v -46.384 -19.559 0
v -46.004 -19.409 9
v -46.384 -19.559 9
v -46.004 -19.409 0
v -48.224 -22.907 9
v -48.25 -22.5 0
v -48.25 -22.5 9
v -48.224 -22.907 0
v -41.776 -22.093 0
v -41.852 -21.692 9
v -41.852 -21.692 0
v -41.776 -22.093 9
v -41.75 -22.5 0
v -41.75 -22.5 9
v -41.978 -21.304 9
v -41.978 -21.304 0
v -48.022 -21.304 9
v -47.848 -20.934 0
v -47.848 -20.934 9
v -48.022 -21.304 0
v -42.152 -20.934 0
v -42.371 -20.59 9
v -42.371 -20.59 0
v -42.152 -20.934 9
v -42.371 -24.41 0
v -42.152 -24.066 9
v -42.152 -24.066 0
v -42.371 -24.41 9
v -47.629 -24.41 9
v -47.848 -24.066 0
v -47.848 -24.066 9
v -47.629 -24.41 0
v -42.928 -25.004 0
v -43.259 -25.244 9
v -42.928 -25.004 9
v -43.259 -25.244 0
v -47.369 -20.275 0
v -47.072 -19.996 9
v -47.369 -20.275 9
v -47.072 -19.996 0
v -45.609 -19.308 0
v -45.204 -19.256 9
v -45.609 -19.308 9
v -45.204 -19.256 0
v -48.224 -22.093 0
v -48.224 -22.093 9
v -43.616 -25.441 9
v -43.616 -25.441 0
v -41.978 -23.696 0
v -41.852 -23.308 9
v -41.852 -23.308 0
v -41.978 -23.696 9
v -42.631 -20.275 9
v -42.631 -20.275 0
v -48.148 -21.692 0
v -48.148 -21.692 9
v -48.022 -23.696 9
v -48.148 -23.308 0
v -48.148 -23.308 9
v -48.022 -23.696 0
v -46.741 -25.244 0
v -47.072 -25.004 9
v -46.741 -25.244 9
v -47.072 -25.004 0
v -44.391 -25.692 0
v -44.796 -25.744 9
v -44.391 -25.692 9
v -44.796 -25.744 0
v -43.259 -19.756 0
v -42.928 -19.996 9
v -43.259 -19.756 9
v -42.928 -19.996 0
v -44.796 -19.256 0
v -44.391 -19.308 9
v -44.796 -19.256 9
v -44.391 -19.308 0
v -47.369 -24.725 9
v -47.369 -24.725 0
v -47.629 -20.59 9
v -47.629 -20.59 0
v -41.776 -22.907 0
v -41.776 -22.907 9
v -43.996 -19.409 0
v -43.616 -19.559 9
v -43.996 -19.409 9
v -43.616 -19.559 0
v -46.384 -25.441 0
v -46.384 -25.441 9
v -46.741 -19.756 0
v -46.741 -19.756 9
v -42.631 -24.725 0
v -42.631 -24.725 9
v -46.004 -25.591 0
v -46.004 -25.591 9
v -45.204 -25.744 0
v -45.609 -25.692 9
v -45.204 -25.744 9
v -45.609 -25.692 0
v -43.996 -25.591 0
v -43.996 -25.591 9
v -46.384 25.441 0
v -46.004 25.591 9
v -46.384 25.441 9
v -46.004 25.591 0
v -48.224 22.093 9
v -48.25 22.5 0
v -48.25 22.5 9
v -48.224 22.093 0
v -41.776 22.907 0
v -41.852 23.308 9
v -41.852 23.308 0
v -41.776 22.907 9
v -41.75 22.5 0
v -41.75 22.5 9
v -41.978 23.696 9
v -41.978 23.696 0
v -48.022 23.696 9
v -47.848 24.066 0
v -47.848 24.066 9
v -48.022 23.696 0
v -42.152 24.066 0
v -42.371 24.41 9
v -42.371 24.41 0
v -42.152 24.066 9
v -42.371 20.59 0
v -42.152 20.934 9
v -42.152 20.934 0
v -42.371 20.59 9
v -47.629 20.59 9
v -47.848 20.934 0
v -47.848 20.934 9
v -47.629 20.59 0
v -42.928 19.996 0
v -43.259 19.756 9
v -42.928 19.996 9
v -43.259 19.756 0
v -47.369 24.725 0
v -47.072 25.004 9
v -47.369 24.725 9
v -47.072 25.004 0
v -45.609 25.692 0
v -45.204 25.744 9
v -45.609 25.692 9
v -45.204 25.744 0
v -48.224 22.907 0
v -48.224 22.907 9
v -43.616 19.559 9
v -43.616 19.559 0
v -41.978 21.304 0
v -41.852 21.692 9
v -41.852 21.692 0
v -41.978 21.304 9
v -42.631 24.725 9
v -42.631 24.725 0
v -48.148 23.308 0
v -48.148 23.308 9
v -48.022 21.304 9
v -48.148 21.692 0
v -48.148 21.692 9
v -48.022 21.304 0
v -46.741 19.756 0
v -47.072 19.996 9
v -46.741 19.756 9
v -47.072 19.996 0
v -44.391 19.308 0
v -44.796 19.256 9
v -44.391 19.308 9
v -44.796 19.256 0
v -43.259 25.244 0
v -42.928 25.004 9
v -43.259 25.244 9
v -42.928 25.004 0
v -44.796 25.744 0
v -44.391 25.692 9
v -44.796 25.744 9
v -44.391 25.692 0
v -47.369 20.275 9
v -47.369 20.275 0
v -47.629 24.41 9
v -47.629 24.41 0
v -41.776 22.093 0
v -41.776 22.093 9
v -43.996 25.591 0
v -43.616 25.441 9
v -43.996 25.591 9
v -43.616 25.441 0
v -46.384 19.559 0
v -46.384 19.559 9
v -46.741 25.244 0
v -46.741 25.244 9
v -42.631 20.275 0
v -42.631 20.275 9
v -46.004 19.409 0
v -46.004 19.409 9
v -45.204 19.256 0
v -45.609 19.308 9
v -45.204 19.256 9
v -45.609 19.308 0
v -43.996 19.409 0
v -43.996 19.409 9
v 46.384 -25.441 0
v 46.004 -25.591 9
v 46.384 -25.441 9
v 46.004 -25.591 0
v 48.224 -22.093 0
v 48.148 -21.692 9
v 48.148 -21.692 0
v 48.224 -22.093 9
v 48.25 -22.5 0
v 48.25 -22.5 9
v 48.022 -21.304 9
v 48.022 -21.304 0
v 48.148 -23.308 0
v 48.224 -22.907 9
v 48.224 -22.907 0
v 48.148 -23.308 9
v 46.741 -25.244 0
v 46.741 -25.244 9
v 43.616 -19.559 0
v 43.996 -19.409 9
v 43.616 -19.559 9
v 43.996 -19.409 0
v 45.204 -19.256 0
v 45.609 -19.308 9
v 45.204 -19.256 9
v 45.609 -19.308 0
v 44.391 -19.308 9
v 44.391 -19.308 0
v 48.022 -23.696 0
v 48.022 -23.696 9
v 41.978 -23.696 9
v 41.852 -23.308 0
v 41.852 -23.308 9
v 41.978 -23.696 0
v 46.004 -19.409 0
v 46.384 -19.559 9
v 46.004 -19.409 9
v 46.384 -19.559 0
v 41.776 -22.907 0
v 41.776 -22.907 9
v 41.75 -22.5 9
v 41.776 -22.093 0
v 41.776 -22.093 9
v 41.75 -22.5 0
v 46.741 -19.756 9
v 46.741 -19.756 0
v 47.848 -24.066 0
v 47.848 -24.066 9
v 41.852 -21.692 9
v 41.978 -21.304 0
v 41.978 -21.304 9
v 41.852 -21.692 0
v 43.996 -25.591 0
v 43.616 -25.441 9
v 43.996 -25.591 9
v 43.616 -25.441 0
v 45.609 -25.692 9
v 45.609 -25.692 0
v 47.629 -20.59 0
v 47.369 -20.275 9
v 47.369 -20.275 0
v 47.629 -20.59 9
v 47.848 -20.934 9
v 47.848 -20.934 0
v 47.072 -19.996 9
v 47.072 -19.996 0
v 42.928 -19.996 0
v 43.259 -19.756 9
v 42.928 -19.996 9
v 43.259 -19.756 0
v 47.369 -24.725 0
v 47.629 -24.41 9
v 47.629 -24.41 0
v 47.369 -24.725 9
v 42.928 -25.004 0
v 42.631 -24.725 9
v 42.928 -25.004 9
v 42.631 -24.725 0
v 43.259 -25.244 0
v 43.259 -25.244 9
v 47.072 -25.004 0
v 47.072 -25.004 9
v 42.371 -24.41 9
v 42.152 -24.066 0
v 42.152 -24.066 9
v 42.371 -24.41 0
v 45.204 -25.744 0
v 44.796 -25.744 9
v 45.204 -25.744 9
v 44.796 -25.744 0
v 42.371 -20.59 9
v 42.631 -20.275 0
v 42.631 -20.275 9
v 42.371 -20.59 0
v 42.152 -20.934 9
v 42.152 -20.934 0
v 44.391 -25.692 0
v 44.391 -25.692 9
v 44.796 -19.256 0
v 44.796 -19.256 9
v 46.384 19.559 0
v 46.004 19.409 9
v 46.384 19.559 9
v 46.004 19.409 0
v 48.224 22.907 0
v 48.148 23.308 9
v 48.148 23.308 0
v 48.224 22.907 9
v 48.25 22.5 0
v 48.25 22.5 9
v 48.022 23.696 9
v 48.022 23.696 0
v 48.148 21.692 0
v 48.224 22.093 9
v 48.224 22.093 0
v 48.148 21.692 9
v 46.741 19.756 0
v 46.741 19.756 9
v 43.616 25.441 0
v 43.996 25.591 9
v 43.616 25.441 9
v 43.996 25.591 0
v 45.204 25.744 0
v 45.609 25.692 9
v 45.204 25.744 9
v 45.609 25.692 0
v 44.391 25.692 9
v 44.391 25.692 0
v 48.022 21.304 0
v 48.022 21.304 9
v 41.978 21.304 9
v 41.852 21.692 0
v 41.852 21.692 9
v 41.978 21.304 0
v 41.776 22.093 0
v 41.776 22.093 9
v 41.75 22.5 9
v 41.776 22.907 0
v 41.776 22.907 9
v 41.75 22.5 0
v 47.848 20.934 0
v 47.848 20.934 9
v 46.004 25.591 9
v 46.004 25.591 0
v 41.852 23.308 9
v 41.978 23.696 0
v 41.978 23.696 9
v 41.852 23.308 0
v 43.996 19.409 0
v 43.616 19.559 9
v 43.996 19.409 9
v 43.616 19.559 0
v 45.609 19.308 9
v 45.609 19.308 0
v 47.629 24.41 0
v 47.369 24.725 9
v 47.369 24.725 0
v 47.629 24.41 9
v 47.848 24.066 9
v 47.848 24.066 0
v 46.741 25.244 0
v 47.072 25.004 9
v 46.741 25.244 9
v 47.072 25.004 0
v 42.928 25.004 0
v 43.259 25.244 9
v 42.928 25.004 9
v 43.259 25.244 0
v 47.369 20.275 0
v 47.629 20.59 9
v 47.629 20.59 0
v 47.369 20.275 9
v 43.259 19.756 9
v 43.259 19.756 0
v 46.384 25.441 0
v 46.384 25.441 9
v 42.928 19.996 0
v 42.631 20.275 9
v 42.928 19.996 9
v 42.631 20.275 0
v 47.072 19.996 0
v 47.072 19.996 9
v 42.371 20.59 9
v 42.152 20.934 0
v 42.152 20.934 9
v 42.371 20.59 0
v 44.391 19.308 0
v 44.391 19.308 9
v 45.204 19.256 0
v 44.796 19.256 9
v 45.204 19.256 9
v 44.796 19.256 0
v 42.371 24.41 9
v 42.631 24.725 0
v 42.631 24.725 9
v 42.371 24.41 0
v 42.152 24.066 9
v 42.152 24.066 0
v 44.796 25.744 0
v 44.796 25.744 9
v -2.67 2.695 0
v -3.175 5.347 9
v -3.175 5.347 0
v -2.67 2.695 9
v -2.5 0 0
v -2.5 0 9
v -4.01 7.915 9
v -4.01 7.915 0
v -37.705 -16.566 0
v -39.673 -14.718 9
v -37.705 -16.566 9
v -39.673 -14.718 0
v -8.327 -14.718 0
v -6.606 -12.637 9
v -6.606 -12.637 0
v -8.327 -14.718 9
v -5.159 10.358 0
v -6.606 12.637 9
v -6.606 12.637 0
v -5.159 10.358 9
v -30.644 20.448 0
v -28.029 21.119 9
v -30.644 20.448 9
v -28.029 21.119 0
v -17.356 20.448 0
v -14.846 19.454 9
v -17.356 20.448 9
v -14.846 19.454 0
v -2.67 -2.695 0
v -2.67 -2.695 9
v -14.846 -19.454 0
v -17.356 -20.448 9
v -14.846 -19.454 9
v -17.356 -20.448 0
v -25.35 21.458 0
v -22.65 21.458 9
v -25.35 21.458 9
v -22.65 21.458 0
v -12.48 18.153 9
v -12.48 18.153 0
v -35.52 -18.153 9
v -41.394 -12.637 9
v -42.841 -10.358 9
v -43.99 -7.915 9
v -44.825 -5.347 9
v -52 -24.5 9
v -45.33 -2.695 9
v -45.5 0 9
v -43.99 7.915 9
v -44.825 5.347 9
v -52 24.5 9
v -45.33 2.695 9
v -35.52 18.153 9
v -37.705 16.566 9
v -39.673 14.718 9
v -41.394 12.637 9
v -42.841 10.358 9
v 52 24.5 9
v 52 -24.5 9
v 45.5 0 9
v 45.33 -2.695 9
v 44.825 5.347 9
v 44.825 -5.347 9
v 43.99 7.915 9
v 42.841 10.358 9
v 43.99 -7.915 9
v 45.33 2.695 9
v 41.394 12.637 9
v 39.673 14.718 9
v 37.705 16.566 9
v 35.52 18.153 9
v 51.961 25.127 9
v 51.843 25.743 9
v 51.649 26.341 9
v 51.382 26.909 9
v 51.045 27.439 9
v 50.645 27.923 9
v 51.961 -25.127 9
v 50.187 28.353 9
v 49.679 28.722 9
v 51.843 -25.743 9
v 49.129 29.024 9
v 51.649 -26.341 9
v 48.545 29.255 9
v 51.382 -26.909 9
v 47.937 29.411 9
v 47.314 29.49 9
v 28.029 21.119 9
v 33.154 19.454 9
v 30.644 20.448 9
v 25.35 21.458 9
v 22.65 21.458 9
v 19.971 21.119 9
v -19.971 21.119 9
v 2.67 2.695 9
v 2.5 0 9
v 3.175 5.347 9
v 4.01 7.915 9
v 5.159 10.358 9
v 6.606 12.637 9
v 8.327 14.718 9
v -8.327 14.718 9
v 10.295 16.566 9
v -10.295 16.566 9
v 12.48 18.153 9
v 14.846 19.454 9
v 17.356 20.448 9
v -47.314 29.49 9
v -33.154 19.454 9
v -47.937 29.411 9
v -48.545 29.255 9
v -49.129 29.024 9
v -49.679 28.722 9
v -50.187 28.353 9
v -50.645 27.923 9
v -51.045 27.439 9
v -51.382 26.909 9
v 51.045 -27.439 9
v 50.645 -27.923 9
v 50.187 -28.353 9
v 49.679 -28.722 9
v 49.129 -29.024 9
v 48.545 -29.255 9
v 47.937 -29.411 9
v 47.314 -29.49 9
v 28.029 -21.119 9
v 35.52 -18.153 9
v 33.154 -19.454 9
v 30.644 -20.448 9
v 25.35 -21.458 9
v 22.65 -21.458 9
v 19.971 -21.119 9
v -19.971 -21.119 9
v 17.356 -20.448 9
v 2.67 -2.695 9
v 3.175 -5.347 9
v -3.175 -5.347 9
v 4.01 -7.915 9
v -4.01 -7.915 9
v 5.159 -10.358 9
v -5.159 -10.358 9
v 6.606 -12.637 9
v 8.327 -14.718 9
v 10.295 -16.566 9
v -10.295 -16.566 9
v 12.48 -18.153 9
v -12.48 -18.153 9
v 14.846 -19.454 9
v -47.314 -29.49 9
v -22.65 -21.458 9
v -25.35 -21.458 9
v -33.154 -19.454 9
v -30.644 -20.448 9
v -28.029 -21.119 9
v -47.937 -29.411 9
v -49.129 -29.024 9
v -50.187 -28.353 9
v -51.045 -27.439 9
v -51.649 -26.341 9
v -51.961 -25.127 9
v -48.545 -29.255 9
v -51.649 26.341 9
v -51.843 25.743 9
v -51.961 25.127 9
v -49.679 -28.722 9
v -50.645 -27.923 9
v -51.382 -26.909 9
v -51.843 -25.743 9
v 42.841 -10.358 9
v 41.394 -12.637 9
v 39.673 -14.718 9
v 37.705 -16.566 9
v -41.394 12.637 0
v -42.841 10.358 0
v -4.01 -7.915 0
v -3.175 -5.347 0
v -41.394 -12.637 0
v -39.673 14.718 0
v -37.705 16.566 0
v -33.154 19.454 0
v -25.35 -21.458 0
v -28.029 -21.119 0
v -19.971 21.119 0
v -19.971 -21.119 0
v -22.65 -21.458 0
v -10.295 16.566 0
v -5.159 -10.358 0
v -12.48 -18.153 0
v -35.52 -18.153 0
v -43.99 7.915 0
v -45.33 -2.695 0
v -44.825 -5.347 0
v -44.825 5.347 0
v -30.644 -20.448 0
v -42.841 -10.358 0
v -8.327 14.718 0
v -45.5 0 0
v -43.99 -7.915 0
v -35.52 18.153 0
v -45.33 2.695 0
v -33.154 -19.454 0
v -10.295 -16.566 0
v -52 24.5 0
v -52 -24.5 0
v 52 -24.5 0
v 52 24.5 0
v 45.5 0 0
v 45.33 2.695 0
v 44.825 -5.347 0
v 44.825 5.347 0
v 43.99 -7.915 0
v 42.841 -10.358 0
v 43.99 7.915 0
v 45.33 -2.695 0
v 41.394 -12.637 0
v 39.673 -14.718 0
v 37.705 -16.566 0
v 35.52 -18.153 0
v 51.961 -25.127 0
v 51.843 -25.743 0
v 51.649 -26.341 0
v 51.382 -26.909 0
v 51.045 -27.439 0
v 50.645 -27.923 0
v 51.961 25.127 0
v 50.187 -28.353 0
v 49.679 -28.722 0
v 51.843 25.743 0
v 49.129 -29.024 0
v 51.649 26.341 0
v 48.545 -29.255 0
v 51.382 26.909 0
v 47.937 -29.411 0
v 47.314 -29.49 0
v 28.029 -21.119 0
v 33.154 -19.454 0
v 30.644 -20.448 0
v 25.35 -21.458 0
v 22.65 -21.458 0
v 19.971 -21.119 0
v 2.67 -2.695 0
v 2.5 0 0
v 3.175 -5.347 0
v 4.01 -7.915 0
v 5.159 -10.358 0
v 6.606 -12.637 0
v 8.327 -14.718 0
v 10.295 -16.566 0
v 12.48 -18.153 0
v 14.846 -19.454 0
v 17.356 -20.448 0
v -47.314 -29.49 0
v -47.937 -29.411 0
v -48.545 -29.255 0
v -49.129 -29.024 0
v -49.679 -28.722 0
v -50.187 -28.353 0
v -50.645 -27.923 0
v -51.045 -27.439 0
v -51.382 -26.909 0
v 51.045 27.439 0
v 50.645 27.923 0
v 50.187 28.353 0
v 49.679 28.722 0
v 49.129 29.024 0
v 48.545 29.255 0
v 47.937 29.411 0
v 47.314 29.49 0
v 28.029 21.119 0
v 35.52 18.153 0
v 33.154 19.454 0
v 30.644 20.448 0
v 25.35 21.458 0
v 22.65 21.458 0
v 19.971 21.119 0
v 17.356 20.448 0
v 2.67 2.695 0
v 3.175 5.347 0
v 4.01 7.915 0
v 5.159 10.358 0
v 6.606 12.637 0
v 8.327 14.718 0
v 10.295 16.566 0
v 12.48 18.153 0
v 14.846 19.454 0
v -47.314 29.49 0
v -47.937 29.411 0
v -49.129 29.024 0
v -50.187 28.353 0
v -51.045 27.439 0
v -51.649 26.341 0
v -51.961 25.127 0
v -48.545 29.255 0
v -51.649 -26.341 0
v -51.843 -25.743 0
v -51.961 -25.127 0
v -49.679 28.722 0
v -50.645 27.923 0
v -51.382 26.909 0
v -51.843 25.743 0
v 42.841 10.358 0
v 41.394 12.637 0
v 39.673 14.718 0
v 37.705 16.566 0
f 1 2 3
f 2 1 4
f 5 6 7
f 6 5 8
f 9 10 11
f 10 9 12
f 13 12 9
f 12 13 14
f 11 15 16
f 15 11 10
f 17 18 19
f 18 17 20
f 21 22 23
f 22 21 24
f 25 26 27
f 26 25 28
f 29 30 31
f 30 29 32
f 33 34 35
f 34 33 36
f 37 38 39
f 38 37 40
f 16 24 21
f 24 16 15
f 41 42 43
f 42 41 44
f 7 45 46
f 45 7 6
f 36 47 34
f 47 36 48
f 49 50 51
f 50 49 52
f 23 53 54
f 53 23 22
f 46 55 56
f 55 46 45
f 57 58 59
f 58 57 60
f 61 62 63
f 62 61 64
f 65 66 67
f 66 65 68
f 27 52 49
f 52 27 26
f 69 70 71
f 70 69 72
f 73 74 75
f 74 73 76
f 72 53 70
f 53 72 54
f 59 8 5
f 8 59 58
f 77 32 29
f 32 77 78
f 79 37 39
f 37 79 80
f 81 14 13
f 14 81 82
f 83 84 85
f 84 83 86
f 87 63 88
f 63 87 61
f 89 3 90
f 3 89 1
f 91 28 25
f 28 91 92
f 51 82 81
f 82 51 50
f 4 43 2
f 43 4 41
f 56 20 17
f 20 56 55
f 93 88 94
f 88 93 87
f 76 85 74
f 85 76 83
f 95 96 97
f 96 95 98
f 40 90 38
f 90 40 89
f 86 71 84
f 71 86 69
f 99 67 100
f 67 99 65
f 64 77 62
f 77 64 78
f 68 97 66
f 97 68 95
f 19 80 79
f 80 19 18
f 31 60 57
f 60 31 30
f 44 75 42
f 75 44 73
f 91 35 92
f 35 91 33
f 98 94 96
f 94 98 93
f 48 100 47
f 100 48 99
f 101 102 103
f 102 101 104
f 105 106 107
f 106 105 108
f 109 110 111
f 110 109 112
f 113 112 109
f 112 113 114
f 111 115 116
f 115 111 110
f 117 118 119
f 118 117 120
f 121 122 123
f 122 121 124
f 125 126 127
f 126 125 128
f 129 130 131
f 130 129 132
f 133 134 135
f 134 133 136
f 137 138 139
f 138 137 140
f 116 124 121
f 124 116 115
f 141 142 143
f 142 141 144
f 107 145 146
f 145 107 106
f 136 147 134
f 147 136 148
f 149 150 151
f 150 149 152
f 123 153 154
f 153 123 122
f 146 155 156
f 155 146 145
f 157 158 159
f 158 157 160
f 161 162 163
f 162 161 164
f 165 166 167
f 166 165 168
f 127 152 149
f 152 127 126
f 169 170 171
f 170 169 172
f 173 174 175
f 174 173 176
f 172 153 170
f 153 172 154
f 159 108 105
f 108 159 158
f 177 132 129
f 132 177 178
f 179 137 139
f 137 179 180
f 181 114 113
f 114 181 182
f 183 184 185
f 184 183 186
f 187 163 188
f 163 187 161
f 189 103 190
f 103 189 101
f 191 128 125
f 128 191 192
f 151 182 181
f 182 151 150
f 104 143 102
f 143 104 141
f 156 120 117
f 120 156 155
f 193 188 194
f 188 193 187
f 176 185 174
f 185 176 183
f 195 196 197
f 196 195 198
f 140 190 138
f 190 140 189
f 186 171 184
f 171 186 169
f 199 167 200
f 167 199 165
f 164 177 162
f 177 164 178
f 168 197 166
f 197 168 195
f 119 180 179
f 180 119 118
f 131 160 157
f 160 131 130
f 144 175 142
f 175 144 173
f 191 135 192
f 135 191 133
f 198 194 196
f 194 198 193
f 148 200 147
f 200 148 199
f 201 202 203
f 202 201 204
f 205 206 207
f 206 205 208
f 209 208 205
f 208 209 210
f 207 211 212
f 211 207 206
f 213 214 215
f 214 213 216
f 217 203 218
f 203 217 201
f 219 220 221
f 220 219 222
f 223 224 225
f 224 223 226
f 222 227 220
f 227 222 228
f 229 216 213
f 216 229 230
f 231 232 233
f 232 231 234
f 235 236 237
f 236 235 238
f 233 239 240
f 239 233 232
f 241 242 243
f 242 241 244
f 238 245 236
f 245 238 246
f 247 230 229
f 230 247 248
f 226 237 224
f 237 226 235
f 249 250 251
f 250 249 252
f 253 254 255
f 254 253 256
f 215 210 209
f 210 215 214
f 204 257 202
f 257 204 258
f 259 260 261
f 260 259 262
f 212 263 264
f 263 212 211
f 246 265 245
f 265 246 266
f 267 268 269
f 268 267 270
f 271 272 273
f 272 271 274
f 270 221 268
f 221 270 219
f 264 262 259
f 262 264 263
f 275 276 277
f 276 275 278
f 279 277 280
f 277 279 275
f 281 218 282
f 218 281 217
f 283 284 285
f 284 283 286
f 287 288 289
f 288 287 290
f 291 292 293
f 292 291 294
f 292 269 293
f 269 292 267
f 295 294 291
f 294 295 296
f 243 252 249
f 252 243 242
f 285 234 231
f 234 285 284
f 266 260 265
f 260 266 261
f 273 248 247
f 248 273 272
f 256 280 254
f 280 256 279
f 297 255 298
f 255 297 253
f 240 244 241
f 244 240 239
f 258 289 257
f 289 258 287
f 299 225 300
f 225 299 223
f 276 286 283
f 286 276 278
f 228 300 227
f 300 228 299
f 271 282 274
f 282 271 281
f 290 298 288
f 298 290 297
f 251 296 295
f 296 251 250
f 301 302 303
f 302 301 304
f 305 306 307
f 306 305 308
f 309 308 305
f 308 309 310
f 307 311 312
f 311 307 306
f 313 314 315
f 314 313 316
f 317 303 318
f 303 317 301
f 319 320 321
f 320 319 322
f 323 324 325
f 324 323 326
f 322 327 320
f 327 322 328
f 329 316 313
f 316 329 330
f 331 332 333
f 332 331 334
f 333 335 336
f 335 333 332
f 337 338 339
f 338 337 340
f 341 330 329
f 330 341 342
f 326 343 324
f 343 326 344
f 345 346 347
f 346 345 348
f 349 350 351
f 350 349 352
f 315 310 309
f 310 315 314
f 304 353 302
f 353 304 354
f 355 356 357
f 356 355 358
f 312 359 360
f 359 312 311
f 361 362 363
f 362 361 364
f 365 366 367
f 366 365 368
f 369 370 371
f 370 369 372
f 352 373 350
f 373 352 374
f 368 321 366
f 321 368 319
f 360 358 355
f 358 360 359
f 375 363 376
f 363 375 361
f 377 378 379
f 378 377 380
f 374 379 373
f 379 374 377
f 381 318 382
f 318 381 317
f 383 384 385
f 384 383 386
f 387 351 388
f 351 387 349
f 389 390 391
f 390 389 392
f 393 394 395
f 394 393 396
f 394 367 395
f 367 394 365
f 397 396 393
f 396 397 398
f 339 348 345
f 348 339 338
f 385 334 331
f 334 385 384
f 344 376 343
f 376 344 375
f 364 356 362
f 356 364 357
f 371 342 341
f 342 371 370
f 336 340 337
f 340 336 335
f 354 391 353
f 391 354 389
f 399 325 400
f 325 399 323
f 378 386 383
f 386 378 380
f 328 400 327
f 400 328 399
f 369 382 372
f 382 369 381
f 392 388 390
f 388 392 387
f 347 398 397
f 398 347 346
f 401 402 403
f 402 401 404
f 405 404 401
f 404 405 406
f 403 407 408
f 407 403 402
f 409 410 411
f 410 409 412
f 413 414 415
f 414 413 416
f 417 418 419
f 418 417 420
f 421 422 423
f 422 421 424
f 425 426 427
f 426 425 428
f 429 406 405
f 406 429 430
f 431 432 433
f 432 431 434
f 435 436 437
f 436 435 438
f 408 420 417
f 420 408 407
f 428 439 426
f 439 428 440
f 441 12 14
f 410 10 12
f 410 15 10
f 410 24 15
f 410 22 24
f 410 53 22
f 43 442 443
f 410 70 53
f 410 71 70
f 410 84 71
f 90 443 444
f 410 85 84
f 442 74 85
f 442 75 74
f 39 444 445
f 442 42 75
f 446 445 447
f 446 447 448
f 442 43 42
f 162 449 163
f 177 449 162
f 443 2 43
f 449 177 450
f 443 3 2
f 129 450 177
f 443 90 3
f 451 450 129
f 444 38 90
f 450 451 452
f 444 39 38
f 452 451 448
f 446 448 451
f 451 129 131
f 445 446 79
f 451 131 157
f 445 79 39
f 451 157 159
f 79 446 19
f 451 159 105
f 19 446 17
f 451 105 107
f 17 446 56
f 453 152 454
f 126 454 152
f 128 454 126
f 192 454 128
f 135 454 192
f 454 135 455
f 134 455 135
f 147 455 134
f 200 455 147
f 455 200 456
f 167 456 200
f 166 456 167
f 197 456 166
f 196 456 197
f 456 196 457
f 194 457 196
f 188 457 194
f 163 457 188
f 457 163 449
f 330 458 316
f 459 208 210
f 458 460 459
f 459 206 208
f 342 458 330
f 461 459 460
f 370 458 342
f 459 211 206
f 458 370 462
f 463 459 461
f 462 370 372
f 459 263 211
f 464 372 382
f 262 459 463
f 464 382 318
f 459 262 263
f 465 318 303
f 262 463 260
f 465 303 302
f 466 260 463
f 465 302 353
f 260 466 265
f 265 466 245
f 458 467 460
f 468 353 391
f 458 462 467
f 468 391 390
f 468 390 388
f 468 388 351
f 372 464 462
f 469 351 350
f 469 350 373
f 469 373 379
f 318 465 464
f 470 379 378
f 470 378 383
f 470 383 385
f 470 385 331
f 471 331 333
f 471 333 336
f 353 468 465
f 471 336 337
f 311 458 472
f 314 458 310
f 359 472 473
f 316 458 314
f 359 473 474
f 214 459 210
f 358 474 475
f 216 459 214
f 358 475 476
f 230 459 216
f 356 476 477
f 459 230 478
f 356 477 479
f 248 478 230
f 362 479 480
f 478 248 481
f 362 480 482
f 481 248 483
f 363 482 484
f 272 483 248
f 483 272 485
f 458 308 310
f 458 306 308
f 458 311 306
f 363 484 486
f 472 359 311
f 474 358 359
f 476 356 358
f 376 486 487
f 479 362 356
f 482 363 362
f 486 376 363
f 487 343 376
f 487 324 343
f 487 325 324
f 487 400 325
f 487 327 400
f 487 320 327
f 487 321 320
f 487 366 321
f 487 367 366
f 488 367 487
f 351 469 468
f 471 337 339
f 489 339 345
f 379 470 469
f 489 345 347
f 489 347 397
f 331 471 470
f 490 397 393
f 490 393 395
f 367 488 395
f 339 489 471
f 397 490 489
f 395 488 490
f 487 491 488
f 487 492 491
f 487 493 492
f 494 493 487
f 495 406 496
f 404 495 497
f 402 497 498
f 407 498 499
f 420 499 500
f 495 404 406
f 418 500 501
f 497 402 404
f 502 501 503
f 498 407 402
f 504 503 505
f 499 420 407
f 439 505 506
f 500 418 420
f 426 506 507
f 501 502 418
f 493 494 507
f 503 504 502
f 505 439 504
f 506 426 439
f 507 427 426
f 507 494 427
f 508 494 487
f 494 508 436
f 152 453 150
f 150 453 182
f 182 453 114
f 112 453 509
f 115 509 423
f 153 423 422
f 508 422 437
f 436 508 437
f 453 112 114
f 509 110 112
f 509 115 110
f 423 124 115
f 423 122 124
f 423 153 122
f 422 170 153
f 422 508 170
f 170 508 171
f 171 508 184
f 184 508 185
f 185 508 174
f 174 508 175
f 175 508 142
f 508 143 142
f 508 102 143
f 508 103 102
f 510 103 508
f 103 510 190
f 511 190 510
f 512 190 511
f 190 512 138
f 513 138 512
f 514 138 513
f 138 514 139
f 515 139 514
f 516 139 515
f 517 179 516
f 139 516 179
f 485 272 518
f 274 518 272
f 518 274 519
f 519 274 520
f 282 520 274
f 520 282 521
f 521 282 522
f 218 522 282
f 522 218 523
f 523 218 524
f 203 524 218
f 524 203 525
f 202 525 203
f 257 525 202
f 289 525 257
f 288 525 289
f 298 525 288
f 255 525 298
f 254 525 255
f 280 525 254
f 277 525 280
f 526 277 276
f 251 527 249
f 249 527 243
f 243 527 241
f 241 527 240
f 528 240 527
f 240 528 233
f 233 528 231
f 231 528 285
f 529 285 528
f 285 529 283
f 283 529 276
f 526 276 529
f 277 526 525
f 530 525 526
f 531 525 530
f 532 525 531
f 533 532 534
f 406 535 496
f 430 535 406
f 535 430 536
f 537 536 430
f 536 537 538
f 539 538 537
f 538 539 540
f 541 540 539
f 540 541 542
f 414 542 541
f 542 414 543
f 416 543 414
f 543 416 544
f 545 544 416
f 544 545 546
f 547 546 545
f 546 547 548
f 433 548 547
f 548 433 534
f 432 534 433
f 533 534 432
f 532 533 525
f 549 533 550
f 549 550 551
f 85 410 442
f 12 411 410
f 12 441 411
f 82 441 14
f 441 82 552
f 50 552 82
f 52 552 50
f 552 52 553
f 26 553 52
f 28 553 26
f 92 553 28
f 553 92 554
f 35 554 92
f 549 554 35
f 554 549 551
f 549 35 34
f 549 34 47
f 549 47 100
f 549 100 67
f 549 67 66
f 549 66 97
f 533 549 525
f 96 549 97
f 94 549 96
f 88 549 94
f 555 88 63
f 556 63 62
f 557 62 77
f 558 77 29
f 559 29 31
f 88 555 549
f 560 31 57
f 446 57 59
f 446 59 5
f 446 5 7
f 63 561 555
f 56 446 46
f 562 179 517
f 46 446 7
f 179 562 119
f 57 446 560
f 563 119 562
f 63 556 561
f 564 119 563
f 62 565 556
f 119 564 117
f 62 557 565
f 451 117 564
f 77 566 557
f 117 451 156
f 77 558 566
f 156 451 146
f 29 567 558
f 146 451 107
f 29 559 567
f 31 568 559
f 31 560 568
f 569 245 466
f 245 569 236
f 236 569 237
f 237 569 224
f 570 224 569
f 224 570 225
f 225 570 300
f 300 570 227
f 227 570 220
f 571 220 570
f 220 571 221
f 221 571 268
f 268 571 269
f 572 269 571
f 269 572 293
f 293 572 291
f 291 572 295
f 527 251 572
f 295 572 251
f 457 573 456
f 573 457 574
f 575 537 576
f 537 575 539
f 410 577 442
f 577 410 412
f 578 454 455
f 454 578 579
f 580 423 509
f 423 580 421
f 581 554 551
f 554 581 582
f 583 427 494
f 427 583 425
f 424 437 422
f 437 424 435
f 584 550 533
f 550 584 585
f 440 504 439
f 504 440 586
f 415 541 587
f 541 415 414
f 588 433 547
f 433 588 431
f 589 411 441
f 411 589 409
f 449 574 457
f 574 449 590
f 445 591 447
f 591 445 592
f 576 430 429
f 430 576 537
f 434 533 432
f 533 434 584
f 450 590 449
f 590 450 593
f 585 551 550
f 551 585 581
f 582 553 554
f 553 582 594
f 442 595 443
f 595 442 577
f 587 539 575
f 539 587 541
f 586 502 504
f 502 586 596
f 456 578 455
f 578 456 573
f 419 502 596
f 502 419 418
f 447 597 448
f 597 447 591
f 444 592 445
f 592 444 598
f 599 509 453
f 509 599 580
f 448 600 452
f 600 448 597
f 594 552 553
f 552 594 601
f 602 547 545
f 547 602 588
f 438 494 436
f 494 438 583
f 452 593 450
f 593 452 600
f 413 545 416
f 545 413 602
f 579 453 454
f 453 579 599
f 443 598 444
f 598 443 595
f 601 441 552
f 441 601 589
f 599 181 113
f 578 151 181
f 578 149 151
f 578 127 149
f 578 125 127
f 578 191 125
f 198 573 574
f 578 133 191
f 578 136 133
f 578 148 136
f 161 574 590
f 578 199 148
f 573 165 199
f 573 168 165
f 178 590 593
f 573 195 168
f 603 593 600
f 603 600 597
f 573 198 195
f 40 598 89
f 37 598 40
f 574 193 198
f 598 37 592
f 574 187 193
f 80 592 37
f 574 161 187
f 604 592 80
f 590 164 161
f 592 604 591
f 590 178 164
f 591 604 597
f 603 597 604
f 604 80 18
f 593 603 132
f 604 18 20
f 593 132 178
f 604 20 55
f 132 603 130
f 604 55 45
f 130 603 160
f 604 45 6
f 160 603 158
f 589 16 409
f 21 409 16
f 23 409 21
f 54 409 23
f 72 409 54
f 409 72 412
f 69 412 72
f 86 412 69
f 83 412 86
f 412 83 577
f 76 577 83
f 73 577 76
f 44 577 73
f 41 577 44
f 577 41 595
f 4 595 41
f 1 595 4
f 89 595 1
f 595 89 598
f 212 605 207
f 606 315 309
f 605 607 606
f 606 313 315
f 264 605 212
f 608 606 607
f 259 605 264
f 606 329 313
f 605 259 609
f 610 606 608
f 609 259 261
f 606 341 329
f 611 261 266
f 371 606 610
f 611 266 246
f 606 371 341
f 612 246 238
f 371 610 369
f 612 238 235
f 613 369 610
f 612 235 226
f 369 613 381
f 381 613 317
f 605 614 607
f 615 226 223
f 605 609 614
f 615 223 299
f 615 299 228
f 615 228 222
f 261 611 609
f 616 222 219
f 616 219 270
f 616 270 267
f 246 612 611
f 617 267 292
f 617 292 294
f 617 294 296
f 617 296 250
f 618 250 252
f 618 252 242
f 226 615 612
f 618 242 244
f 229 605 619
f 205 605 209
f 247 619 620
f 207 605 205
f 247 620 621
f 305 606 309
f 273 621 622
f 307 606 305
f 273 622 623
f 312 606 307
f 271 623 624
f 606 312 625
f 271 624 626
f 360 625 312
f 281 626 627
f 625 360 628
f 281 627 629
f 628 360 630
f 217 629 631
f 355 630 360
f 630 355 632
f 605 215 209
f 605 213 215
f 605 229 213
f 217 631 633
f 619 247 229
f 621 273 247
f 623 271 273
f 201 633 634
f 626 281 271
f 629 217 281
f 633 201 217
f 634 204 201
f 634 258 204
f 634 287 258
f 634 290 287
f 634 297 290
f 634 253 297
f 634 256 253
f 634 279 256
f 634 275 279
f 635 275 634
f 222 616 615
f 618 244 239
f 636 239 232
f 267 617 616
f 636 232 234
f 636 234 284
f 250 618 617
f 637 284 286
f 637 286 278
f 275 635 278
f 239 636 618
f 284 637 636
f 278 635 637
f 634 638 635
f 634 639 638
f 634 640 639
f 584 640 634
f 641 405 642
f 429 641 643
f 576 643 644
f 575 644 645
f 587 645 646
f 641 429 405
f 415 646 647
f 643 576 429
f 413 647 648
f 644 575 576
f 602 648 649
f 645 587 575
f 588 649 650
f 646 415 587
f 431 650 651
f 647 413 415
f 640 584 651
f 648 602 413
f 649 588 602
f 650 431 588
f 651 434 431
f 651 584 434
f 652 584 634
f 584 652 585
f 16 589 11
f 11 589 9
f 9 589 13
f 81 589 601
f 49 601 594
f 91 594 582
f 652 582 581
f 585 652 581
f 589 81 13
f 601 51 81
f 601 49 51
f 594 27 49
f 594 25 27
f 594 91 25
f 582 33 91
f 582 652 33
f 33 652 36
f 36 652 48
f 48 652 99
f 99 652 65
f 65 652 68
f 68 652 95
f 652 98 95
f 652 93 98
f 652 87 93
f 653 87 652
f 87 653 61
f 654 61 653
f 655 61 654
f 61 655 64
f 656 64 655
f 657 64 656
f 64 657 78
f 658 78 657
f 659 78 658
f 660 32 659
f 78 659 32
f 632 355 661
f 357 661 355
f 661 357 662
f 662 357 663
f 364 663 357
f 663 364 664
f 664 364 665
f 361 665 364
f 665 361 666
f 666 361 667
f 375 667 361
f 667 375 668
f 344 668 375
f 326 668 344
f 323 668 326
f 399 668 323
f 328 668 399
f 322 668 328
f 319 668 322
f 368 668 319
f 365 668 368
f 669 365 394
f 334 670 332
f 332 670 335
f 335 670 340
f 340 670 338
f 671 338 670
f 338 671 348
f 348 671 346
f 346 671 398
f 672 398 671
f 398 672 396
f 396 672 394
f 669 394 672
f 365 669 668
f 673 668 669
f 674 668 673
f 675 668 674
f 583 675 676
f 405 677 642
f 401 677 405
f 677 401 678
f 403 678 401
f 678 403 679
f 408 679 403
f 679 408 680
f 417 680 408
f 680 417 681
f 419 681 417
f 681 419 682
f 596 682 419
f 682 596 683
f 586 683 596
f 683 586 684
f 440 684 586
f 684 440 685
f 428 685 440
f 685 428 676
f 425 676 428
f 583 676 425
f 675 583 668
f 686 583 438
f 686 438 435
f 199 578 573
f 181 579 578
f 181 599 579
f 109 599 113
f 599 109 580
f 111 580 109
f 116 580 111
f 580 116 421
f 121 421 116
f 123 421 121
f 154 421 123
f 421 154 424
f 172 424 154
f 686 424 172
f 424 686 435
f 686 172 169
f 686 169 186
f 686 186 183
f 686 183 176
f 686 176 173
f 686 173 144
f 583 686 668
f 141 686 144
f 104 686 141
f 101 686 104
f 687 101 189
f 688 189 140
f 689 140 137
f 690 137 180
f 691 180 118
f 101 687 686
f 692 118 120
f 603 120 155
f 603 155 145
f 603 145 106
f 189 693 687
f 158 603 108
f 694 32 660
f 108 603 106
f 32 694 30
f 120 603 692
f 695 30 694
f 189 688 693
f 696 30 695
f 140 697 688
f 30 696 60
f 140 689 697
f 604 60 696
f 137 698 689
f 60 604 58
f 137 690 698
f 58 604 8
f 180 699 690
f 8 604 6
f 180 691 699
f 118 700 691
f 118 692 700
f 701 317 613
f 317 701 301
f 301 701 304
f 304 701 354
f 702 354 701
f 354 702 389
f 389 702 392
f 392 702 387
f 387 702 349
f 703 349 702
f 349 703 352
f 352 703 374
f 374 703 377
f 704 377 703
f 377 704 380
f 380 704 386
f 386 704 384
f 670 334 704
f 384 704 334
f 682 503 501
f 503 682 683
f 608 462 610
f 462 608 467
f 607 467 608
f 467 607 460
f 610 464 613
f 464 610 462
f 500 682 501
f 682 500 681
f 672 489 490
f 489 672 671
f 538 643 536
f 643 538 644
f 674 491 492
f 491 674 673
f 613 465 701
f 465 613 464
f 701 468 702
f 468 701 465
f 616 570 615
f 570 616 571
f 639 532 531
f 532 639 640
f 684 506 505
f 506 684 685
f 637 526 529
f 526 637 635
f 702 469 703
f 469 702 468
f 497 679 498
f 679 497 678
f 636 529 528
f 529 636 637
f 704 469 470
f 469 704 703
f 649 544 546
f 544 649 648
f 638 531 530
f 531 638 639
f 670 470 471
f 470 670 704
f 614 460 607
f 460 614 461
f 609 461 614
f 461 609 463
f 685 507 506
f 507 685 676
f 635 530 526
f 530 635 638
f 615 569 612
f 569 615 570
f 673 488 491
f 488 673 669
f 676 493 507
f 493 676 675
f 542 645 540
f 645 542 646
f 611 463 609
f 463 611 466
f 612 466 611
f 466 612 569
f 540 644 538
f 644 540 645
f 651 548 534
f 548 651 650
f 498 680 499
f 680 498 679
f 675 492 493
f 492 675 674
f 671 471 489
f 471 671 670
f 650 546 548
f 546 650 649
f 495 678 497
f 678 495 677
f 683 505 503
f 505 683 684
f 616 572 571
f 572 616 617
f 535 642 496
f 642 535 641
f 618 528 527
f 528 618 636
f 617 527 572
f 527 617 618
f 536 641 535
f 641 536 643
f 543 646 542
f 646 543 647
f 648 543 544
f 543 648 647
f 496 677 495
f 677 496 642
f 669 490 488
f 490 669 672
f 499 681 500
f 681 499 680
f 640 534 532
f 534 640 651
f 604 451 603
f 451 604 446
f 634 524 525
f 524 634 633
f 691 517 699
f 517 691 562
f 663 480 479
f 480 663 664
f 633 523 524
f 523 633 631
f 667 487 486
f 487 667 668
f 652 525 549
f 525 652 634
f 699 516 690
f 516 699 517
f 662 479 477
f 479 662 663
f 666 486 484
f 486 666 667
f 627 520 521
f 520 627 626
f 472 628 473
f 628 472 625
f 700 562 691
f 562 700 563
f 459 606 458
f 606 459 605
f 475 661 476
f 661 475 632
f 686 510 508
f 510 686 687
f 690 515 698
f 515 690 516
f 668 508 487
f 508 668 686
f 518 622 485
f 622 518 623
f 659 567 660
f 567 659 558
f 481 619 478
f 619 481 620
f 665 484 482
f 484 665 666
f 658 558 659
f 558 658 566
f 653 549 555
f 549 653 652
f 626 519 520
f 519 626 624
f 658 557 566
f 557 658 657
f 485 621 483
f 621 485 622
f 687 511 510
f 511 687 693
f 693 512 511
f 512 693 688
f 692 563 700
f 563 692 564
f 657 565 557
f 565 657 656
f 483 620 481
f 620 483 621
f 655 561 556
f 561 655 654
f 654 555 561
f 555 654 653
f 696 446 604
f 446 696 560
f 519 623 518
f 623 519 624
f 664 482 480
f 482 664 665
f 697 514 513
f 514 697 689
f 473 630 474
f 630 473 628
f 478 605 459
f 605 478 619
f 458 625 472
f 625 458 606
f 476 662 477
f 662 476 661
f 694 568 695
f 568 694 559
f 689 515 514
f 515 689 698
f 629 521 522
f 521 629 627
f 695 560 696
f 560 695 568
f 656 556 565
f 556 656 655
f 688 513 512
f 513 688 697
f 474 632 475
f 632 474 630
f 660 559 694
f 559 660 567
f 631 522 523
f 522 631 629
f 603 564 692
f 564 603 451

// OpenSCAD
$fn = 50;


difference() {
	union() {
		hull() {
			translate(v = [-47.0000000000, 24.5000000000, 0]) {
				cylinder(h = 9, r = 5);
			}
			translate(v = [47.0000000000, 24.5000000000, 0]) {
				cylinder(h = 9, r = 5);
			}
			translate(v = [-47.0000000000, -24.5000000000, 0]) {
				cylinder(h = 9, r = 5);
			}
			translate(v = [47.0000000000, -24.5000000000, 0]) {
				cylinder(h = 9, r = 5);
			}
		}
	}
	union() {
		#translate(v = [-45.0000000000, -22.5000000000, -100.0000000000]) {
			cylinder(h = 200, r = 3.2500000000);
		}
		#translate(v = [-45.0000000000, 22.5000000000, -100.0000000000]) {
			cylinder(h = 200, r = 3.2500000000);
		}
		#translate(v = [45.0000000000, -22.5000000000, -100.0000000000]) {
			cylinder(h = 200, r = 3.2500000000);
		}
		#translate(v = [45.0000000000, 22.5000000000, -100.0000000000]) {
			cylinder(h = 200, r = 3.2500000000);
		}
		#translate(v = [-24.0000000000, 0, 0]) {
			cylinder(h = 9, r = 21.5000000000);
		}
		#translate(v = [24.0000000000, 0, 0]) {
			cylinder(h = 9, r = 21.5000000000);
		}
	}
}
